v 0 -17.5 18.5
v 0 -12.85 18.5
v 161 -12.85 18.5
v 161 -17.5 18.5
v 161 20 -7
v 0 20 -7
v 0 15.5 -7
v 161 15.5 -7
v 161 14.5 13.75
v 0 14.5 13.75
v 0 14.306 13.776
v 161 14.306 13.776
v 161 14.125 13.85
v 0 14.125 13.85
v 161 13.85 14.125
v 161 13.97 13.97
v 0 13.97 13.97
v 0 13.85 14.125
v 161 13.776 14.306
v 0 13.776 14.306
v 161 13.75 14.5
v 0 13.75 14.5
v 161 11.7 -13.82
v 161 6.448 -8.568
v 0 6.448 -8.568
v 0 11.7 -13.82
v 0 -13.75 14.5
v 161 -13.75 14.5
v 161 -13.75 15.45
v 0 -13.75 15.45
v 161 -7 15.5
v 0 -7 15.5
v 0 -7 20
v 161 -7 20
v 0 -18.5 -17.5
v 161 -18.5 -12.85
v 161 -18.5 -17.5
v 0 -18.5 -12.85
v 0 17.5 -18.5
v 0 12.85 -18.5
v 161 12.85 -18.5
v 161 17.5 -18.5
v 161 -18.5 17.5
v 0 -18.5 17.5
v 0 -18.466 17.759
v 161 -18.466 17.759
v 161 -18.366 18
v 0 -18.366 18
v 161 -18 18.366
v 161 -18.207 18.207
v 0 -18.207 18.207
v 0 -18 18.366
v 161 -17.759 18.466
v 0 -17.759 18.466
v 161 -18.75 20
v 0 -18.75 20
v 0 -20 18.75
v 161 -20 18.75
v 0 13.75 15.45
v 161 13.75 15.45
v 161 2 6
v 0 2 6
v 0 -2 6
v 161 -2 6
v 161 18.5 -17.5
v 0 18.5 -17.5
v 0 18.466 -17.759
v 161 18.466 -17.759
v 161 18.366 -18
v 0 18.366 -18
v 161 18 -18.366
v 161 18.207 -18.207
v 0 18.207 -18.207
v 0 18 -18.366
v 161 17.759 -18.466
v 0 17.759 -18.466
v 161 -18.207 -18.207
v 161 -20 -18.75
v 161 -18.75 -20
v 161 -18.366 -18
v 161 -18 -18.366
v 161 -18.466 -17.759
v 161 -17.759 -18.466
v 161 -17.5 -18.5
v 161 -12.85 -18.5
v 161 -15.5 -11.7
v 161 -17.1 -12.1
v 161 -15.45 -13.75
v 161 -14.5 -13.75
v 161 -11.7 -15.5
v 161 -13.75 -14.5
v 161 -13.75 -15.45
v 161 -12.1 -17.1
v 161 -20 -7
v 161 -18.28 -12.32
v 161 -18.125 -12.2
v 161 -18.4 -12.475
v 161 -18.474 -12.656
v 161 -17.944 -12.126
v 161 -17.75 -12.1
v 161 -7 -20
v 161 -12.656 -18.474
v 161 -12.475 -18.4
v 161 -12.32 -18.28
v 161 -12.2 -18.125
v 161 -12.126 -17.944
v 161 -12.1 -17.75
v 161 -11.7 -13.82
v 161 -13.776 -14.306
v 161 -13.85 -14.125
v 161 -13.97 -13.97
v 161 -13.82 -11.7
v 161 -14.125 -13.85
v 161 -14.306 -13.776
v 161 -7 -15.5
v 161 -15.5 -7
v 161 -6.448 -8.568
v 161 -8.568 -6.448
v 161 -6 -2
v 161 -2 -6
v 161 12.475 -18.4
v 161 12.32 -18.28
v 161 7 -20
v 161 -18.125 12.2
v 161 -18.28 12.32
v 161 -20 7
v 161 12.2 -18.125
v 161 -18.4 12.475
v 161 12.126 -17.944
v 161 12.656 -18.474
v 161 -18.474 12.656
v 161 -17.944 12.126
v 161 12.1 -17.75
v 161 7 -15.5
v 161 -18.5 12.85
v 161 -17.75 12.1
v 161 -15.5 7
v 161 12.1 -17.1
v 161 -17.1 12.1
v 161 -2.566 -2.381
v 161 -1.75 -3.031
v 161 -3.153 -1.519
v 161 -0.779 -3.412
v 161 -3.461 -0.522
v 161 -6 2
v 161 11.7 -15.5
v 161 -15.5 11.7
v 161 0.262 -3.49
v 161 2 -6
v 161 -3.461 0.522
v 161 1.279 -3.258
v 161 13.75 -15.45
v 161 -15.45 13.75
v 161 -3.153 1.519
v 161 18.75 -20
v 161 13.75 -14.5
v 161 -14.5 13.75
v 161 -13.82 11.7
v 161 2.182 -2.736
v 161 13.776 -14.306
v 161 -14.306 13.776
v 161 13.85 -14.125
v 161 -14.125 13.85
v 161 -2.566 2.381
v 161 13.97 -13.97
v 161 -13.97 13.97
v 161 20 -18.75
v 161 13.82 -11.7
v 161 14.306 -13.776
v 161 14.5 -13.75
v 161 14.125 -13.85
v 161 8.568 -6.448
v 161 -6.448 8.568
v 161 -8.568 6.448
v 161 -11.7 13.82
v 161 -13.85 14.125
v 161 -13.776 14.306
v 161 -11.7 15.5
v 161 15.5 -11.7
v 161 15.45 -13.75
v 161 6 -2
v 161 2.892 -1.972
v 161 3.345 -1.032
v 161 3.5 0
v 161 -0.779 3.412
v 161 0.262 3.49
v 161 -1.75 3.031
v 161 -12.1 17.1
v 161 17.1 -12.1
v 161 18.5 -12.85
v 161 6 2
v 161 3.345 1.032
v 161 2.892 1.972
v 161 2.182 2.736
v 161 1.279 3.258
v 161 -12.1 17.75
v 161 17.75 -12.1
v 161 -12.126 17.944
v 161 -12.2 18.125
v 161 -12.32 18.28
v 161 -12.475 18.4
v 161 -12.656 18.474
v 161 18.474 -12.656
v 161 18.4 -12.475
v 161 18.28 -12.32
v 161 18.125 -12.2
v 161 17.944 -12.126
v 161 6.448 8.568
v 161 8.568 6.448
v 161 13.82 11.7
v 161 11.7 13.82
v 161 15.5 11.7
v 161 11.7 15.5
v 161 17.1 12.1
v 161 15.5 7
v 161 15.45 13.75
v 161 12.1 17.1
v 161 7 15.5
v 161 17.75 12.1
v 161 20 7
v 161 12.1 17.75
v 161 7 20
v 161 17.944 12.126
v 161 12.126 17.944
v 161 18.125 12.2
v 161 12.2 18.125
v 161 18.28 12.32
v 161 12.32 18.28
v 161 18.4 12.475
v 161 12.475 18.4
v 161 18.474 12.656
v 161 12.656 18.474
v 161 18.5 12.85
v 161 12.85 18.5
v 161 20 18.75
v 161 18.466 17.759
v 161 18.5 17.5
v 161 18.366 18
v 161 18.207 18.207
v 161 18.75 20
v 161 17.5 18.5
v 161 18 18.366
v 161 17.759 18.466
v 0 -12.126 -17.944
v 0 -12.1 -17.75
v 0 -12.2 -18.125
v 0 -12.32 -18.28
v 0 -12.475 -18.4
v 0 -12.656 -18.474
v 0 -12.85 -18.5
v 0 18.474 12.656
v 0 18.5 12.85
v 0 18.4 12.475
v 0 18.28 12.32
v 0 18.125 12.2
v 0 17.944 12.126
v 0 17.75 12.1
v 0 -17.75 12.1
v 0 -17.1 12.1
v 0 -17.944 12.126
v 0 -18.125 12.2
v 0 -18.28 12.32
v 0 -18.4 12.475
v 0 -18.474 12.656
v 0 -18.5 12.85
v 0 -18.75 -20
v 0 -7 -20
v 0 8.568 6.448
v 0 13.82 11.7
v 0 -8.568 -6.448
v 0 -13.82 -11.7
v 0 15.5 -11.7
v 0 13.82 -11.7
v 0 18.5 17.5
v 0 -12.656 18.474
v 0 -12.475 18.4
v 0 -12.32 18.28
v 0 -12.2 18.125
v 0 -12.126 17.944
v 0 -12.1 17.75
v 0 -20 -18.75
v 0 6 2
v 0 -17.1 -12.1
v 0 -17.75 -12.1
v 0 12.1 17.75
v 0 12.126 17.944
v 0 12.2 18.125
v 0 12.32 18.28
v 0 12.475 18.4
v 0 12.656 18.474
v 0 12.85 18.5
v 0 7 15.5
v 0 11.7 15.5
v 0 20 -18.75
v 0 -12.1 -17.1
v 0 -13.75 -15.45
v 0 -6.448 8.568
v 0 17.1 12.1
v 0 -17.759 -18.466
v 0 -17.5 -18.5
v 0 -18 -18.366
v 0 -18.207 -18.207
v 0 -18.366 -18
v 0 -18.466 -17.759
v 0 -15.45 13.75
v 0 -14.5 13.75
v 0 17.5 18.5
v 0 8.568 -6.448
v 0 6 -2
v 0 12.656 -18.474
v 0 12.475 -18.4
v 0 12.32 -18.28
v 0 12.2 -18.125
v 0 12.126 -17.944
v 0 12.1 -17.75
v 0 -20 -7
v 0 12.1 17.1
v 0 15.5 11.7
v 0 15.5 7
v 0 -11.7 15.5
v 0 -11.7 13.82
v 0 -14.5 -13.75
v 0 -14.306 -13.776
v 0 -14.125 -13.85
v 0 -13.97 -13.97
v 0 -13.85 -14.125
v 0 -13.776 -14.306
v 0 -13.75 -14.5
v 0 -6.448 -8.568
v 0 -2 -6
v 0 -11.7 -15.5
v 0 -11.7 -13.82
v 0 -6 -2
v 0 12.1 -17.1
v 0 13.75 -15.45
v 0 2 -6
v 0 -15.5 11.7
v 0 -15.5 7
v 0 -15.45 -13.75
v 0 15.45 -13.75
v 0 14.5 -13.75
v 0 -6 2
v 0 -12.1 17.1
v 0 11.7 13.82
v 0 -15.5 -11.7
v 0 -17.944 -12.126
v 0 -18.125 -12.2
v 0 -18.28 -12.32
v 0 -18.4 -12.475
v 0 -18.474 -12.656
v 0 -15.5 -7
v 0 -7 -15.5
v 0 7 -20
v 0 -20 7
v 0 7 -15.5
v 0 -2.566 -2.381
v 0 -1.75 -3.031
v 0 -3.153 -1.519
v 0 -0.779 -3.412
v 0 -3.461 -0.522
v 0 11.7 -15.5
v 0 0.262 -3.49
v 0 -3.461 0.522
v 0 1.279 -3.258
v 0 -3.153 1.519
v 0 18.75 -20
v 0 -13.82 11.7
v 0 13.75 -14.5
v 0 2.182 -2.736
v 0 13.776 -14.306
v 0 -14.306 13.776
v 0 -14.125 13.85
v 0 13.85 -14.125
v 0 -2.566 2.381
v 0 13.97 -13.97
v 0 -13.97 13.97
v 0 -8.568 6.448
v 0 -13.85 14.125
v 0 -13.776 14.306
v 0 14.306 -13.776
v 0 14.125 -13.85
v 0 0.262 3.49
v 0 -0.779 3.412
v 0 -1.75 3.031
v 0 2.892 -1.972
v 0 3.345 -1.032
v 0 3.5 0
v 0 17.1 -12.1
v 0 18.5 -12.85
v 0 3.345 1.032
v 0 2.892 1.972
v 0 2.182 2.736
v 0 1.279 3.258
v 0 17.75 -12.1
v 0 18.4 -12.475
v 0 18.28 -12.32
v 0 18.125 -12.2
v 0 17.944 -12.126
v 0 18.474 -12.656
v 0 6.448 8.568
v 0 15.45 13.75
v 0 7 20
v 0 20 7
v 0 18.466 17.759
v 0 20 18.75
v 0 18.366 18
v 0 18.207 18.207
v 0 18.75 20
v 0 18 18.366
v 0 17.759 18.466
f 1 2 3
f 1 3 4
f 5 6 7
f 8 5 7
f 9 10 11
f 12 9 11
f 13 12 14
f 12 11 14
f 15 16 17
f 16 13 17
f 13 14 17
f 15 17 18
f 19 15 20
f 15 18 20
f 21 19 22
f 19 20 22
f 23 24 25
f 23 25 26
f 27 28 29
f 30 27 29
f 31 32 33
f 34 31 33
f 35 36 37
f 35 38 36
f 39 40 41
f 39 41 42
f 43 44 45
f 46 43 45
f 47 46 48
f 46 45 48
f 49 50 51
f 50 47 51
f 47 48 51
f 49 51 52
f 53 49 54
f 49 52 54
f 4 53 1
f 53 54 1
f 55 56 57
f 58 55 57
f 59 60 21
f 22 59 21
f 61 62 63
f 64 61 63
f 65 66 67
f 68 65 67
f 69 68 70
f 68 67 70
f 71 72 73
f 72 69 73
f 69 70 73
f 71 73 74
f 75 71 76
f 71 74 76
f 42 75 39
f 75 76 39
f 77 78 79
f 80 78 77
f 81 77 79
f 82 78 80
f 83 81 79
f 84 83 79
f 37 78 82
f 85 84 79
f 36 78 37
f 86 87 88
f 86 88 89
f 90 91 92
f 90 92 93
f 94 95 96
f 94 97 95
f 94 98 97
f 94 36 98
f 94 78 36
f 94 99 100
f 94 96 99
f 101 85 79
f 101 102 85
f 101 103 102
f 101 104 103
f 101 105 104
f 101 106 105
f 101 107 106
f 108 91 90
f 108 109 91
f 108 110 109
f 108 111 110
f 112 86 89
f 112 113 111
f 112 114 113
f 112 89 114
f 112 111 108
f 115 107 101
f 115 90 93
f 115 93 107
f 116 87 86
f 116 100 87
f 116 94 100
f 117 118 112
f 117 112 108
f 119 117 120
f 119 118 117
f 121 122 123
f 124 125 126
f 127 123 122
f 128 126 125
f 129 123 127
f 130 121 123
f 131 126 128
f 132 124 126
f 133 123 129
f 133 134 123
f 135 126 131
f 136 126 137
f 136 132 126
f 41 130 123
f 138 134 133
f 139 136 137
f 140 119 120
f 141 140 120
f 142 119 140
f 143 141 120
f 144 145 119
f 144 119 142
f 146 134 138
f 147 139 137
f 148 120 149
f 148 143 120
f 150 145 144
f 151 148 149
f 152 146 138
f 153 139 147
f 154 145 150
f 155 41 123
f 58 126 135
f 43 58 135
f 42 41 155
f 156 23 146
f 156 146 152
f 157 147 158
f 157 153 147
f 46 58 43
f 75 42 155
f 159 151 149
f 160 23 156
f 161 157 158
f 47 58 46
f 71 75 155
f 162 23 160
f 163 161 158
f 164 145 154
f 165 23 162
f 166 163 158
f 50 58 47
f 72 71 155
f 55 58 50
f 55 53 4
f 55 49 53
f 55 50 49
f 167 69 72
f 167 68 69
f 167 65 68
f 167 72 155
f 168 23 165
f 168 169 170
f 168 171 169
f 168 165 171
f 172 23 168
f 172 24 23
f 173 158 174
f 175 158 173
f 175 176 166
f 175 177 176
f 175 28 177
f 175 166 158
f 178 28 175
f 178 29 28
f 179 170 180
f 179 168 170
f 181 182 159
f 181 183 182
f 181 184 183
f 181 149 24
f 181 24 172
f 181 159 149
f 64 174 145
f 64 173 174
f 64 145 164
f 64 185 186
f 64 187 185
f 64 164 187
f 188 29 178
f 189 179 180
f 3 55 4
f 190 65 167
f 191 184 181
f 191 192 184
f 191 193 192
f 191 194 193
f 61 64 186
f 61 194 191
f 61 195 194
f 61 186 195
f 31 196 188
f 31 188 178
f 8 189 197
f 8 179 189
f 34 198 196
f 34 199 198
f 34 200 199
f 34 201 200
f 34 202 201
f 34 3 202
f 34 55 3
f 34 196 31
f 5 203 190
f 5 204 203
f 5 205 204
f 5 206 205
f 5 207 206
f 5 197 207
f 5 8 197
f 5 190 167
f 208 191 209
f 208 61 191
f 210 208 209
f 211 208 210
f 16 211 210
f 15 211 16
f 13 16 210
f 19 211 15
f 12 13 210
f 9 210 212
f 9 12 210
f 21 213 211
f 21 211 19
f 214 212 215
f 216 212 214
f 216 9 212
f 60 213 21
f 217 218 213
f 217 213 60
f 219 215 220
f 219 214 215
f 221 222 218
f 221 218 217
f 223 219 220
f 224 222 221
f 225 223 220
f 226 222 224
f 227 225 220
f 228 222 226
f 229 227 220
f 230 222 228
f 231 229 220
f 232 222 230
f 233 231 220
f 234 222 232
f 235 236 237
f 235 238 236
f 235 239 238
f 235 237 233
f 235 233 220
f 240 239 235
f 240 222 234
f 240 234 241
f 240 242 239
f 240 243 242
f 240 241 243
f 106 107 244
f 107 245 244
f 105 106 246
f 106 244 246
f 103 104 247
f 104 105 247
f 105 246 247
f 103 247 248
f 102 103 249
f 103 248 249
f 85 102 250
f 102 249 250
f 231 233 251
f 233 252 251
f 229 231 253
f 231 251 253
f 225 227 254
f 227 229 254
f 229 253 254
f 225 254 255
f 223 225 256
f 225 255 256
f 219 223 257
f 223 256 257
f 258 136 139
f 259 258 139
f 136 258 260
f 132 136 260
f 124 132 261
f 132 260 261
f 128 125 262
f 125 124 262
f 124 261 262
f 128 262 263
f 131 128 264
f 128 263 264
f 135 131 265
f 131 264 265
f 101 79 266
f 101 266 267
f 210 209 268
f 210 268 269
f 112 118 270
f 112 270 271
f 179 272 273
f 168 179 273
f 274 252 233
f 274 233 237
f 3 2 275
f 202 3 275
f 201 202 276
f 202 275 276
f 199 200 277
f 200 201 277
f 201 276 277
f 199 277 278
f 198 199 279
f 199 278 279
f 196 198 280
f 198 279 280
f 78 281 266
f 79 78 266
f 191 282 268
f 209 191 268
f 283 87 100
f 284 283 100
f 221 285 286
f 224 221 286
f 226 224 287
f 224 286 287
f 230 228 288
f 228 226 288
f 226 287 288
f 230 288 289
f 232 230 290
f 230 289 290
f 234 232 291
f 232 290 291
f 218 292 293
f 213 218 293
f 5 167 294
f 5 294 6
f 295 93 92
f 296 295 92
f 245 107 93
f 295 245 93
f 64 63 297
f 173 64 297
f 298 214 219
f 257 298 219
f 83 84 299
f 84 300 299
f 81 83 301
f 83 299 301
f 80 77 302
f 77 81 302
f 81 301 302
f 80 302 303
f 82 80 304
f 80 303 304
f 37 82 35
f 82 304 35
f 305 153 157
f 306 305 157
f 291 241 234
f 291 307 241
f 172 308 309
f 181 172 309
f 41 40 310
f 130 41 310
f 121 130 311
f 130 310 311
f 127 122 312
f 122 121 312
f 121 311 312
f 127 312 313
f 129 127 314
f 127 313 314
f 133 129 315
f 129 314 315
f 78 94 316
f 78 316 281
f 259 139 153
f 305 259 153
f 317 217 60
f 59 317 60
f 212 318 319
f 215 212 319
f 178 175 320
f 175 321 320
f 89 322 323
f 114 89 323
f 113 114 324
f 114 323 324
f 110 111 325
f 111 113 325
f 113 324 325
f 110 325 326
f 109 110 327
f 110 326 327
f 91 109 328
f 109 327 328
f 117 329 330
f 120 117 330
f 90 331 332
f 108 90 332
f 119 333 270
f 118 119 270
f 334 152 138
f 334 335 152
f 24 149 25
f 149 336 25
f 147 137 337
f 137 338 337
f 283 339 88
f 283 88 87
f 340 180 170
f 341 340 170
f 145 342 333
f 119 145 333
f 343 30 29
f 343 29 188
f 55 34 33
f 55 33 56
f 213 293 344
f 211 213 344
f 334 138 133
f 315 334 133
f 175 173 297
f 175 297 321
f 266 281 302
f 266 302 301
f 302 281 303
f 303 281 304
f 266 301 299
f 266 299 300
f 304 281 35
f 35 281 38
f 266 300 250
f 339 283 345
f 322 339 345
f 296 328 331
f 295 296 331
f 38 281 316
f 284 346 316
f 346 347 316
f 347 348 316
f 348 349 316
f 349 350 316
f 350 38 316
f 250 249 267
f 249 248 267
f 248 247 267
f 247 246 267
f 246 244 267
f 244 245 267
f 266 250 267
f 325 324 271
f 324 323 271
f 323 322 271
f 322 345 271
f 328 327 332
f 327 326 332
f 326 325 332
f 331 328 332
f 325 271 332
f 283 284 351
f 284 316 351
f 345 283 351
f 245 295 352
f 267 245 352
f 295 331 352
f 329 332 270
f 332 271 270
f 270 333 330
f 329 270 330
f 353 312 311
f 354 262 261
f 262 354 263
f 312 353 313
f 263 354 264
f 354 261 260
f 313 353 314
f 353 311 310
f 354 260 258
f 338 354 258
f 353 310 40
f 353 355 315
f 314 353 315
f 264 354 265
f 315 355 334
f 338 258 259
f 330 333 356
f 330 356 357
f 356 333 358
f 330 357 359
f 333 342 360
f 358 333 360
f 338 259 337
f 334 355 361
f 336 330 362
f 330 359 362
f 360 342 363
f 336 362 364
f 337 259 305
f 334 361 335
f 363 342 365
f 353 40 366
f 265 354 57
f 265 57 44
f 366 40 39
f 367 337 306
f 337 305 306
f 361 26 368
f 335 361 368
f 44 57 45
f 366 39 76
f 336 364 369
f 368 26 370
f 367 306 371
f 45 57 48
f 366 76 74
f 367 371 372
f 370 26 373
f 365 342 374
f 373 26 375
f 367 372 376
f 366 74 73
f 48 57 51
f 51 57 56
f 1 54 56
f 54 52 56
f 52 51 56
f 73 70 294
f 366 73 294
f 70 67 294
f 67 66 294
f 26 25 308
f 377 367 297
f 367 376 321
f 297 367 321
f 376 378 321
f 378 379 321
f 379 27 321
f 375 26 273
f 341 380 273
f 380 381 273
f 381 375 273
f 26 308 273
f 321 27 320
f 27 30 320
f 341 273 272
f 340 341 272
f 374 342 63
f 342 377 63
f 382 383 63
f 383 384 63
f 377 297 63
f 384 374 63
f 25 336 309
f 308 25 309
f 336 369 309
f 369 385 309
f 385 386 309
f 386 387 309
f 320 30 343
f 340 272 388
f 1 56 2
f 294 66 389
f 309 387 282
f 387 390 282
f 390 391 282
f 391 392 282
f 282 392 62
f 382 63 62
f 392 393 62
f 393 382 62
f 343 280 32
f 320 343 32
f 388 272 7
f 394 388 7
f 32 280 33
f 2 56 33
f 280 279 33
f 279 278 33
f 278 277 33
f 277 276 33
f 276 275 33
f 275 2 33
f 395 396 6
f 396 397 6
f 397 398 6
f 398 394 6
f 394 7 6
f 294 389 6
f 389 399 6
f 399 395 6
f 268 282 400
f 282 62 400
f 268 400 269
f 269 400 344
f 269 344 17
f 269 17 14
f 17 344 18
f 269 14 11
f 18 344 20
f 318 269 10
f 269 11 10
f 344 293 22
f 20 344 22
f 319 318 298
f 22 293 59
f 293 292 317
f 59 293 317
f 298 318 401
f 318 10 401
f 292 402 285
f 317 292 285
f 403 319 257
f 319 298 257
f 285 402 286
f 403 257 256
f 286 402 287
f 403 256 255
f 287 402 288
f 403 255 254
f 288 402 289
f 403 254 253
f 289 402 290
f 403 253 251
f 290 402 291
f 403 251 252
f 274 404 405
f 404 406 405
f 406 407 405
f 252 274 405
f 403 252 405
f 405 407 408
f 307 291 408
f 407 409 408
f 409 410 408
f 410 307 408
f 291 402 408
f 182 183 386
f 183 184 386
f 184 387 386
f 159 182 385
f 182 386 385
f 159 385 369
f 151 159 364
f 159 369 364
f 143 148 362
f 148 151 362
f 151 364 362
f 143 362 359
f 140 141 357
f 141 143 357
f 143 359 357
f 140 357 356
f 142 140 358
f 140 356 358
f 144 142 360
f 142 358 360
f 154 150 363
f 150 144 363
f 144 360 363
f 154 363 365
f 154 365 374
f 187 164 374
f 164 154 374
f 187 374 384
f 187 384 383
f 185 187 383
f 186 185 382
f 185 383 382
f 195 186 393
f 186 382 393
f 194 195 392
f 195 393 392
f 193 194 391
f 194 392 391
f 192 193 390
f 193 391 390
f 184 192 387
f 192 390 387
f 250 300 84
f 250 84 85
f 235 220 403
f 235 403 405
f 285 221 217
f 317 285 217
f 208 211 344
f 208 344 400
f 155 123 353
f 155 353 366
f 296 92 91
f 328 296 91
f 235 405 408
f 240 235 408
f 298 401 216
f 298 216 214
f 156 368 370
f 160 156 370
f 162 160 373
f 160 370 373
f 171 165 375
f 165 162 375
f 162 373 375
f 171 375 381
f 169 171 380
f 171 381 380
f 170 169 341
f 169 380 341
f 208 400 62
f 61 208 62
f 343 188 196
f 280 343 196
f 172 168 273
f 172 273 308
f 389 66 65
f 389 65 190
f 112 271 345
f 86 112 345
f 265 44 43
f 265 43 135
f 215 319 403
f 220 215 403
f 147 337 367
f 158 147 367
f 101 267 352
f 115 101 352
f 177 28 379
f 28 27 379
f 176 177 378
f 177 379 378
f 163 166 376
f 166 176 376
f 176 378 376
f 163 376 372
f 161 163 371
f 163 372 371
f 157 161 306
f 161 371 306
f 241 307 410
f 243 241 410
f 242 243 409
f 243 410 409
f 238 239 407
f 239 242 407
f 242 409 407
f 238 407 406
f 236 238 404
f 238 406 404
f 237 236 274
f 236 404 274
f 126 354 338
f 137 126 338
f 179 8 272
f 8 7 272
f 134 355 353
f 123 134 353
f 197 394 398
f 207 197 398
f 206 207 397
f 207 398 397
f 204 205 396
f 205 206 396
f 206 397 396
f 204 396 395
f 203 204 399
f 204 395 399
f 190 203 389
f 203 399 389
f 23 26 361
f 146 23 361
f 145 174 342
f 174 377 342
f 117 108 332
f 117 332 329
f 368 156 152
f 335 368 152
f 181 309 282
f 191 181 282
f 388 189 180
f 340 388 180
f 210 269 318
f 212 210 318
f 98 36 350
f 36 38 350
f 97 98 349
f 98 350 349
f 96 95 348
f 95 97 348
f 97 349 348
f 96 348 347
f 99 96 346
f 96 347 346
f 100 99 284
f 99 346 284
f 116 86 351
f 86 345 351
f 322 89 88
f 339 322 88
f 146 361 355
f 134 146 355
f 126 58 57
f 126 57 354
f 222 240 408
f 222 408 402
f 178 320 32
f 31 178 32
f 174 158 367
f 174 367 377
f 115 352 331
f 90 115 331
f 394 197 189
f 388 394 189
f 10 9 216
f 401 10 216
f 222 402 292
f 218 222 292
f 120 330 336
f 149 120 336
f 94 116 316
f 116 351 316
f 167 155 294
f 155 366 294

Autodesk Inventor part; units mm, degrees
sketch "Skizze_1" plane through (0, 0, 0) normal (1, 0, 0) x (0, 1, 0)
  line L0 (18.75, 20) -> (7, 20)
  line L1 (7, 20) -> (7, 15.5)
  line L2 (7, 15.5) -> (11.7, 15.5)
  line L3 (11.7, 15.5) -> (11.7, 13.82)
  line L4 (11.7, 13.82) -> (6.4481, 8.5681)
  line L5 (6.4481, 8.5681) -> (2, 6)
  line L6 (2, 6) -> (-2, 6)
  line L7 (-2, 6) -> (-6.4481, 8.5681)
  line L8 (-6.4481, 8.5681) -> (-11.7, 13.82)
  line L9 (-11.7, 13.82) -> (-11.7, 15.5)
  line L10 (-11.7, 15.5) -> (-7, 15.5)
  line L11 (-7, 15.5) -> (-7, 20)
  line L12 (-7, 20) -> (-18.75, 20)
  line L13 (-18.75, 20) -> (-20, 18.75)
  line L14 (-20, 18.75) -> (-20, 7)
  line L15 (-20, 7) -> (-15.5, 7)
  line L16 (-15.5, 7) -> (-15.5, 11.7)
  line L17 (-15.5, 11.7) -> (-13.82, 11.7)
  line L18 (-13.82, 11.7) -> (-8.5681, 6.4481)
  line L19 (-8.5681, 6.4481) -> (-6, 2)
  line L20 (-6, 2) -> (-6, -2)
  line L21 (-6, -2) -> (-8.5681, -6.4481)
  line L22 (-8.5681, -6.4481) -> (-13.82, -11.7)
  line L23 (-13.82, -11.7) -> (-15.5, -11.7)
  line L24 (-15.5, -11.7) -> (-15.5, -7)
  line L25 (-15.5, -7) -> (-20, -7)
  line L26 (-20, -7) -> (-20, -18.75)
  line L27 (-20, -18.75) -> (-18.75, -20)
  line L28 (-18.75, -20) -> (-7, -20)
  line L29 (-7, -20) -> (-7, -15.5)
  line L30 (-7, -15.5) -> (-11.7, -15.5)
  line L31 (-11.7, -15.5) -> (-11.7, -13.82)
  line L32 (-11.7, -13.82) -> (-6.4481, -8.5681)
  line L33 (-6.4481, -8.5681) -> (-2, -6)
  line L34 (-2, -6) -> (2, -6)
  line L35 (2, -6) -> (6.4481, -8.5681)
  line L36 (6.4481, -8.5681) -> (11.7, -13.82)
  line L37 (11.7, -13.82) -> (11.7, -15.5)
  line L38 (11.7, -15.5) -> (7, -15.5)
  line L39 (7, -15.5) -> (7, -20)
  line L40 (7, -20) -> (18.75, -20)
  line L41 (18.75, -20) -> (20, -18.75)
  line L42 (20, -18.75) -> (20, -7)
  line L43 (20, -7) -> (15.5, -7)
  line L44 (15.5, -7) -> (15.5, -11.7)
  line L45 (15.5, -11.7) -> (13.82, -11.7)
  line L46 (13.82, -11.7) -> (8.5681, -6.4481)
  line L47 (8.5681, -6.4481) -> (6, -2)
  line L48 (6, -2) -> (6, 2)
  line L49 (6, 2) -> (8.5681, 6.4481)
  line L50 (8.5681, 6.4481) -> (13.82, 11.7)
  line L51 (13.82, 11.7) -> (15.5, 11.7)
  line L52 (15.5, 11.7) -> (15.5, 7)
  line L53 (15.5, 7) -> (20, 7)
  line L54 (20, 7) -> (20, 18.75)
  line L55 (20, 18.75) -> (18.75, 20)
  line L56 (17.75, -12.1) -> (17.1, -12.1)
  line L57 (17.1, -12.1) -> (15.45, -13.75)
  line L58 (15.45, -13.75) -> (14.5, -13.75)
  arc A0 (14.5, -13.75) -> (13.75, -14.5) centre (14.5, -14.5) ccw
  line L59 (13.75, -14.5) -> (13.75, -15.45)
  line L60 (13.75, -15.45) -> (12.1, -17.1)
  line L61 (12.1, -17.1) -> (12.1, -17.75)
  arc A1 (12.1, -17.75) -> (12.85, -18.5) centre (12.85, -17.75) ccw
  line L62 (12.85, -18.5) -> (17.5, -18.5)
  arc A2 (17.5, -18.5) -> (18.5, -17.5) centre (17.5, -17.5) ccw
  line L63 (18.5, -17.5) -> (18.5, -12.85)
  arc A3 (18.5, -12.85) -> (17.75, -12.1) centre (17.75, -12.85) ccw
  line L64 (-17.1, -12.1) -> (-17.75, -12.1)
  arc A4 (-17.75, -12.1) -> (-18.5, -12.85) centre (-17.75, -12.85) ccw
  line L65 (-18.5, -12.85) -> (-18.5, -17.5)
  arc A5 (-18.5, -17.5) -> (-17.5, -18.5) centre (-17.5, -17.5) ccw
  line L66 (-17.5, -18.5) -> (-12.85, -18.5)
  arc A6 (-12.85, -18.5) -> (-12.1, -17.75) centre (-12.85, -17.75) ccw
  line L67 (-12.1, -17.75) -> (-12.1, -17.1)
  line L68 (-12.1, -17.1) -> (-13.75, -15.45)
  line L69 (-13.75, -15.45) -> (-13.75, -14.5)
  arc A7 (-13.75, -14.5) -> (-14.5, -13.75) centre (-14.5, -14.5) ccw
  line L70 (-14.5, -13.75) -> (-15.45, -13.75)
  line L71 (-15.45, -13.75) -> (-17.1, -12.1)
  circle A8 centre (0, 0) radius 3.5
  arc A9 (-17.5, 18.5) -> (-18.5, 17.5) centre (-17.5, 17.5) ccw
  line L72 (-18.5, 17.5) -> (-18.5, 12.85)
  arc A10 (-18.5, 12.85) -> (-17.75, 12.1) centre (-17.75, 12.85) ccw
  line L73 (-17.75, 12.1) -> (-17.1, 12.1)
  line L74 (-17.1, 12.1) -> (-15.45, 13.75)
  line L75 (-15.45, 13.75) -> (-14.5, 13.75)
  arc A11 (-14.5, 13.75) -> (-13.75, 14.5) centre (-14.5, 14.5) ccw
  line L76 (-13.75, 14.5) -> (-13.75, 15.45)
  line L77 (-13.75, 15.45) -> (-12.1, 17.1)
  line L78 (-12.1, 17.1) -> (-12.1, 17.75)
  arc A12 (-12.1, 17.75) -> (-12.85, 18.5) centre (-12.85, 17.75) ccw
  line L79 (-12.85, 18.5) -> (-17.5, 18.5)
  line L80 (17.5, 18.5) -> (12.85, 18.5)
  arc A13 (12.85, 18.5) -> (12.1, 17.75) centre (12.85, 17.75) ccw
  line L81 (12.1, 17.75) -> (12.1, 17.1)
  line L82 (12.1, 17.1) -> (13.75, 15.45)
  line L83 (13.75, 15.45) -> (13.75, 14.5)
  arc A14 (13.75, 14.5) -> (14.5, 13.75) centre (14.5, 14.5) ccw
  line L84 (14.5, 13.75) -> (15.45, 13.75)
  line L85 (15.45, 13.75) -> (17.1, 12.1)
  line L86 (17.1, 12.1) -> (17.75, 12.1)
  arc A15 (17.75, 12.1) -> (18.5, 12.85) centre (17.75, 12.85) ccw
  line L87 (18.5, 12.85) -> (18.5, 17.5)
  arc A16 (18.5, 17.5) -> (17.5, 18.5) centre (17.5, 17.5) ccw
extrude "Extrusion1" add sketch "Skizze_1" along normal blind 161
ref_plane "CS_ANBAU_HINTEN_LINKS_XY" through (161, 0, 20) normal (1, 0, 0) x (0, 0, -1)
ref_plane "CS_ANBAU_HINTEN_LINKS_YZ" through (161, 0, 20) normal (0, 0, -1) x (0, 1, 0)
ref_plane "CS_ANBAU_HINTEN_LINKS_ZX" through (161, 0, 20) normal (0, 1, 0) x (1, 0, 0)
ref_plane "CS_ANBAU_HINTEN_OBEN_XY" through (161, 20, 0) normal (1, 0, 0) x (0, 0, -1)
ref_plane "CS_ANBAU_HINTEN_OBEN_YZ" through (161, 20, 0) normal (0, 0, -1) x (0, 1, 0)
ref_plane "CS_ANBAU_HINTEN_OBEN_ZX" through (161, 20, 0) normal (0, 1, 0) x (1, 0, 0)
ref_plane "CS_ANBAU_HINTEN_RECHTS_XY" through (161, 0, -20) normal (1, 0, 0) x (0, 0, -1)
ref_plane "CS_ANBAU_HINTEN_RECHTS_YZ" through (161, 0, -20) normal (0, 0, -1) x (0, 1, 0)
ref_plane "CS_ANBAU_HINTEN_RECHTS_ZX" through (161, 0, -20) normal (0, 1, 0) x (1, 0, 0)
ref_plane "CS_ANBAU_HINTEN_UNTEN_XY" through (161, -20, 0) normal (1, 0, 0) x (0, 0, -1)
ref_plane "CS_ANBAU_HINTEN_UNTEN_YZ" through (161, -20, 0) normal (0, 0, -1) x (0, 1, 0)
ref_plane "CS_ANBAU_HINTEN_UNTEN_ZX" through (161, -20, 0) normal (0, 1, 0) x (1, 0, 0)
ref_plane "CS_ANBAU_QUER_XY" through (0, 0, 20) normal (0, 0, 1) x (1, 0, 0)
ref_plane "CS_ANBAU_QUER_YZ" through (0, 0, 20) normal (1, 0, 0) x (0, 1, 0)
ref_plane "CS_ANBAU_QUER_ZX" through (0, 0, 20) normal (0, 1, 0) x (0, 0, 1)
ref_plane "CS_ANBAU_QUER_1_XY" through (161, 0, 20) normal (0, 0, 1) x (1, 0, 0)
ref_plane "CS_ANBAU_QUER_1_YZ" through (161, 0, 20) normal (1, 0, 0) x (0, 1, 0)
ref_plane "CS_ANBAU_QUER_1_ZX" through (161, 0, 20) normal (0, 1, 0) x (0, 0, 1)
ref_plane "CS_ANBAU_VORNE_LINKS_XY" through (0, 0, 20) normal (-1, 0, 0) x (0, 0, -1)
ref_plane "CS_ANBAU_VORNE_LINKS_YZ" through (0, 0, 20) normal (0, 0, -1) x (0, -1, 0)
ref_plane "CS_ANBAU_VORNE_LINKS_ZX" through (0, 0, 20) normal (0, -1, 0) x (-1, 0, 0)
ref_plane "CS_ANBAU_VORNE_OBEN_XY" through (0, 20, 0) normal (-1, 0, 0) x (0, 0, -1)
ref_plane "CS_ANBAU_VORNE_OBEN_YZ" through (0, 20, 0) normal (0, 0, -1) x (0, -1, 0)
ref_plane "CS_ANBAU_VORNE_OBEN_ZX" through (0, 20, 0) normal (0, -1, 0) x (-1, 0, 0)
ref_plane "CS_ANBAU_VORNE_RECHTS_XY" through (0, 0, -20) normal (-1, 0, 0) x (0, 0, -1)
ref_plane "CS_ANBAU_VORNE_RECHTS_YZ" through (0, 0, -20) normal (0, 0, -1) x (0, -1, 0)
ref_plane "CS_ANBAU_VORNE_RECHTS_ZX" through (0, 0, -20) normal (0, -1, 0) x (-1, 0, 0)
ref_plane "CS_ANBAU_VORNE_UNTEN_XY" through (0, -20, 0) normal (-1, 0, 0) x (0, 0, -1)
ref_plane "CS_ANBAU_VORNE_UNTEN_YZ" through (0, -20, 0) normal (0, 0, -1) x (0, -1, 0)
ref_plane "CS_ANBAU_VORNE_UNTEN_ZX" through (0, -20, 0) normal (0, -1, 0) x (-1, 0, 0)
ref_plane "p1_XY" through (0, 20, 0) normal (0, 0, 1) x (1, 0, 0)
ref_plane "p1_YZ" through (0, 20, 0) normal (1, 0, 0) x (0, 1, 0)
ref_plane "p1_ZX" through (0, 20, 0) normal (0, 1, 0) x (0, 0, 1)
ref_plane "p2_XY" through (161, 20, 0) normal (0, 0, 1) x (1, 0, 0)
ref_plane "p2_YZ" through (161, 20, 0) normal (1, 0, 0) x (0, 1, 0)
ref_plane "p2_ZX" through (161, 20, 0) normal (0, 1, 0) x (0, 0, 1)
ref_plane "p3_XY" through (161, -20, 18.75) normal (1, 0, 0) x (0, 0, -1)
ref_plane "p3_YZ" through (161, -20, 18.75) normal (0, 0, -1) x (0, 1, 0)
ref_plane "p3_ZX" through (161, -20, 18.75) normal (0, 1, 0) x (1, 0, 0)
ref_plane "p4_XY" through (161, 20, 18.75) normal (1, 0, 0) x (0, 0, -1)
ref_plane "p4_YZ" through (161, 20, 18.75) normal (0, 0, -1) x (0, 1, 0)
ref_plane "p4_ZX" through (161, 20, 18.75) normal (0, 1, 0) x (1, 0, 0)
ref_plane "p5_XY" through (161, 20, -21.25) normal (1, 0, 0) x (0, 0, -1)
ref_plane "p5_YZ" through (161, 20, -21.25) normal (0, 0, -1) x (0, 1, 0)
ref_plane "p5_ZX" through (161, 20, -21.25) normal (0, 1, 0) x (1, 0, 0)
ref_plane "pm1_XY" through (0, 0, 0) normal (1, 0, 0) x (0, 0, -1)
ref_plane "pm1_YZ" through (0, 0, 0) normal (0, 0, -1) x (0, 1, 0)
ref_plane "pm1_ZX" through (0, 0, 0) normal (0, 1, 0) x (1, 0, 0)
ref_plane "pm2_XY" through (161, 0, -1.25) normal (1, 0, 0) x (0, 0, -1)
ref_plane "pm2_YZ" through (161, 0, -1.25) normal (0, 0, -1) x (0, 1, 0)
ref_plane "pm2_ZX" through (161, 0, -1.25) normal (0, 1, 0) x (1, 0, 0)
properties part number "Robotunits Profil 40 x 40 - PIL 4040 SNN 0161"
